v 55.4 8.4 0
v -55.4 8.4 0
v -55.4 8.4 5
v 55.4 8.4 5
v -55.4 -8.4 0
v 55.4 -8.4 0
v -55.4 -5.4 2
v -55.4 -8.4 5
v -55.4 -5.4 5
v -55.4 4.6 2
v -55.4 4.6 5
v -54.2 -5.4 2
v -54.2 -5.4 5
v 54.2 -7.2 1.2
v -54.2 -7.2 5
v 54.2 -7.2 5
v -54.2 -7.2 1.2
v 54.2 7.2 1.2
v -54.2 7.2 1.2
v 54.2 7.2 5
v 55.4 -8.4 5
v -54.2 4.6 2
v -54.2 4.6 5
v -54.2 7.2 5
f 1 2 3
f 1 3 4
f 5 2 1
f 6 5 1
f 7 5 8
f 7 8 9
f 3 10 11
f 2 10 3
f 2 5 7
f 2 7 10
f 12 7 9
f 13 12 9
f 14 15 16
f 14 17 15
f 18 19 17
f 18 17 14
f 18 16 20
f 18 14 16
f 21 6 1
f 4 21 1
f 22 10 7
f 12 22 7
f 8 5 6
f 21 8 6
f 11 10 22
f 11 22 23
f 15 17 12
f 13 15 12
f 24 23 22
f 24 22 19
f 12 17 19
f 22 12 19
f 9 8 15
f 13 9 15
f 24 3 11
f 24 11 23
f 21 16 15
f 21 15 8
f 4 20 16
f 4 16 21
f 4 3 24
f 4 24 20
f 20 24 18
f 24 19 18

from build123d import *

# Parameters (mm, degrees)
F0_W     = 110.8
F0_H     = 16.8
F0_W_2   = 110
F0_H_2   = 16
F1_DEPTH = 5
F2_T     = -1.2
F4_W     = 10
F4_H     = 3
F5_DEPTH = 2


with BuildPart() as f1:
    # F0 (on Top) → F1 (new body)
    with BuildSketch(Plane.XY):
        Rectangle(F0_W, F0_H)
        Rectangle(F0_W_2, F0_H_2, mode=Mode.SUBTRACT)
        Rectangle(F0_W_2, F0_H_2)
    extrude(amount=F1_DEPTH)

    # F2
    f2_openings = [f1.faces().sort_by_distance(p)[0] for p in [
        (0, 0, 5),
    ]]
    offset(amount=F2_T, openings=f2_openings)

    # F4 (on offset) → F5 (cut)
    with BuildSketch(Plane(origin=(-55.4, 0, 0), x_dir=(0, -1, 0), z_dir=(-1, 0, 0))):
        with Locations((0.4, 3.5)):
            Rectangle(F4_W, F4_H)
    extrude(amount=-F5_DEPTH, mode=Mode.SUBTRACT)


solid = f1.part
